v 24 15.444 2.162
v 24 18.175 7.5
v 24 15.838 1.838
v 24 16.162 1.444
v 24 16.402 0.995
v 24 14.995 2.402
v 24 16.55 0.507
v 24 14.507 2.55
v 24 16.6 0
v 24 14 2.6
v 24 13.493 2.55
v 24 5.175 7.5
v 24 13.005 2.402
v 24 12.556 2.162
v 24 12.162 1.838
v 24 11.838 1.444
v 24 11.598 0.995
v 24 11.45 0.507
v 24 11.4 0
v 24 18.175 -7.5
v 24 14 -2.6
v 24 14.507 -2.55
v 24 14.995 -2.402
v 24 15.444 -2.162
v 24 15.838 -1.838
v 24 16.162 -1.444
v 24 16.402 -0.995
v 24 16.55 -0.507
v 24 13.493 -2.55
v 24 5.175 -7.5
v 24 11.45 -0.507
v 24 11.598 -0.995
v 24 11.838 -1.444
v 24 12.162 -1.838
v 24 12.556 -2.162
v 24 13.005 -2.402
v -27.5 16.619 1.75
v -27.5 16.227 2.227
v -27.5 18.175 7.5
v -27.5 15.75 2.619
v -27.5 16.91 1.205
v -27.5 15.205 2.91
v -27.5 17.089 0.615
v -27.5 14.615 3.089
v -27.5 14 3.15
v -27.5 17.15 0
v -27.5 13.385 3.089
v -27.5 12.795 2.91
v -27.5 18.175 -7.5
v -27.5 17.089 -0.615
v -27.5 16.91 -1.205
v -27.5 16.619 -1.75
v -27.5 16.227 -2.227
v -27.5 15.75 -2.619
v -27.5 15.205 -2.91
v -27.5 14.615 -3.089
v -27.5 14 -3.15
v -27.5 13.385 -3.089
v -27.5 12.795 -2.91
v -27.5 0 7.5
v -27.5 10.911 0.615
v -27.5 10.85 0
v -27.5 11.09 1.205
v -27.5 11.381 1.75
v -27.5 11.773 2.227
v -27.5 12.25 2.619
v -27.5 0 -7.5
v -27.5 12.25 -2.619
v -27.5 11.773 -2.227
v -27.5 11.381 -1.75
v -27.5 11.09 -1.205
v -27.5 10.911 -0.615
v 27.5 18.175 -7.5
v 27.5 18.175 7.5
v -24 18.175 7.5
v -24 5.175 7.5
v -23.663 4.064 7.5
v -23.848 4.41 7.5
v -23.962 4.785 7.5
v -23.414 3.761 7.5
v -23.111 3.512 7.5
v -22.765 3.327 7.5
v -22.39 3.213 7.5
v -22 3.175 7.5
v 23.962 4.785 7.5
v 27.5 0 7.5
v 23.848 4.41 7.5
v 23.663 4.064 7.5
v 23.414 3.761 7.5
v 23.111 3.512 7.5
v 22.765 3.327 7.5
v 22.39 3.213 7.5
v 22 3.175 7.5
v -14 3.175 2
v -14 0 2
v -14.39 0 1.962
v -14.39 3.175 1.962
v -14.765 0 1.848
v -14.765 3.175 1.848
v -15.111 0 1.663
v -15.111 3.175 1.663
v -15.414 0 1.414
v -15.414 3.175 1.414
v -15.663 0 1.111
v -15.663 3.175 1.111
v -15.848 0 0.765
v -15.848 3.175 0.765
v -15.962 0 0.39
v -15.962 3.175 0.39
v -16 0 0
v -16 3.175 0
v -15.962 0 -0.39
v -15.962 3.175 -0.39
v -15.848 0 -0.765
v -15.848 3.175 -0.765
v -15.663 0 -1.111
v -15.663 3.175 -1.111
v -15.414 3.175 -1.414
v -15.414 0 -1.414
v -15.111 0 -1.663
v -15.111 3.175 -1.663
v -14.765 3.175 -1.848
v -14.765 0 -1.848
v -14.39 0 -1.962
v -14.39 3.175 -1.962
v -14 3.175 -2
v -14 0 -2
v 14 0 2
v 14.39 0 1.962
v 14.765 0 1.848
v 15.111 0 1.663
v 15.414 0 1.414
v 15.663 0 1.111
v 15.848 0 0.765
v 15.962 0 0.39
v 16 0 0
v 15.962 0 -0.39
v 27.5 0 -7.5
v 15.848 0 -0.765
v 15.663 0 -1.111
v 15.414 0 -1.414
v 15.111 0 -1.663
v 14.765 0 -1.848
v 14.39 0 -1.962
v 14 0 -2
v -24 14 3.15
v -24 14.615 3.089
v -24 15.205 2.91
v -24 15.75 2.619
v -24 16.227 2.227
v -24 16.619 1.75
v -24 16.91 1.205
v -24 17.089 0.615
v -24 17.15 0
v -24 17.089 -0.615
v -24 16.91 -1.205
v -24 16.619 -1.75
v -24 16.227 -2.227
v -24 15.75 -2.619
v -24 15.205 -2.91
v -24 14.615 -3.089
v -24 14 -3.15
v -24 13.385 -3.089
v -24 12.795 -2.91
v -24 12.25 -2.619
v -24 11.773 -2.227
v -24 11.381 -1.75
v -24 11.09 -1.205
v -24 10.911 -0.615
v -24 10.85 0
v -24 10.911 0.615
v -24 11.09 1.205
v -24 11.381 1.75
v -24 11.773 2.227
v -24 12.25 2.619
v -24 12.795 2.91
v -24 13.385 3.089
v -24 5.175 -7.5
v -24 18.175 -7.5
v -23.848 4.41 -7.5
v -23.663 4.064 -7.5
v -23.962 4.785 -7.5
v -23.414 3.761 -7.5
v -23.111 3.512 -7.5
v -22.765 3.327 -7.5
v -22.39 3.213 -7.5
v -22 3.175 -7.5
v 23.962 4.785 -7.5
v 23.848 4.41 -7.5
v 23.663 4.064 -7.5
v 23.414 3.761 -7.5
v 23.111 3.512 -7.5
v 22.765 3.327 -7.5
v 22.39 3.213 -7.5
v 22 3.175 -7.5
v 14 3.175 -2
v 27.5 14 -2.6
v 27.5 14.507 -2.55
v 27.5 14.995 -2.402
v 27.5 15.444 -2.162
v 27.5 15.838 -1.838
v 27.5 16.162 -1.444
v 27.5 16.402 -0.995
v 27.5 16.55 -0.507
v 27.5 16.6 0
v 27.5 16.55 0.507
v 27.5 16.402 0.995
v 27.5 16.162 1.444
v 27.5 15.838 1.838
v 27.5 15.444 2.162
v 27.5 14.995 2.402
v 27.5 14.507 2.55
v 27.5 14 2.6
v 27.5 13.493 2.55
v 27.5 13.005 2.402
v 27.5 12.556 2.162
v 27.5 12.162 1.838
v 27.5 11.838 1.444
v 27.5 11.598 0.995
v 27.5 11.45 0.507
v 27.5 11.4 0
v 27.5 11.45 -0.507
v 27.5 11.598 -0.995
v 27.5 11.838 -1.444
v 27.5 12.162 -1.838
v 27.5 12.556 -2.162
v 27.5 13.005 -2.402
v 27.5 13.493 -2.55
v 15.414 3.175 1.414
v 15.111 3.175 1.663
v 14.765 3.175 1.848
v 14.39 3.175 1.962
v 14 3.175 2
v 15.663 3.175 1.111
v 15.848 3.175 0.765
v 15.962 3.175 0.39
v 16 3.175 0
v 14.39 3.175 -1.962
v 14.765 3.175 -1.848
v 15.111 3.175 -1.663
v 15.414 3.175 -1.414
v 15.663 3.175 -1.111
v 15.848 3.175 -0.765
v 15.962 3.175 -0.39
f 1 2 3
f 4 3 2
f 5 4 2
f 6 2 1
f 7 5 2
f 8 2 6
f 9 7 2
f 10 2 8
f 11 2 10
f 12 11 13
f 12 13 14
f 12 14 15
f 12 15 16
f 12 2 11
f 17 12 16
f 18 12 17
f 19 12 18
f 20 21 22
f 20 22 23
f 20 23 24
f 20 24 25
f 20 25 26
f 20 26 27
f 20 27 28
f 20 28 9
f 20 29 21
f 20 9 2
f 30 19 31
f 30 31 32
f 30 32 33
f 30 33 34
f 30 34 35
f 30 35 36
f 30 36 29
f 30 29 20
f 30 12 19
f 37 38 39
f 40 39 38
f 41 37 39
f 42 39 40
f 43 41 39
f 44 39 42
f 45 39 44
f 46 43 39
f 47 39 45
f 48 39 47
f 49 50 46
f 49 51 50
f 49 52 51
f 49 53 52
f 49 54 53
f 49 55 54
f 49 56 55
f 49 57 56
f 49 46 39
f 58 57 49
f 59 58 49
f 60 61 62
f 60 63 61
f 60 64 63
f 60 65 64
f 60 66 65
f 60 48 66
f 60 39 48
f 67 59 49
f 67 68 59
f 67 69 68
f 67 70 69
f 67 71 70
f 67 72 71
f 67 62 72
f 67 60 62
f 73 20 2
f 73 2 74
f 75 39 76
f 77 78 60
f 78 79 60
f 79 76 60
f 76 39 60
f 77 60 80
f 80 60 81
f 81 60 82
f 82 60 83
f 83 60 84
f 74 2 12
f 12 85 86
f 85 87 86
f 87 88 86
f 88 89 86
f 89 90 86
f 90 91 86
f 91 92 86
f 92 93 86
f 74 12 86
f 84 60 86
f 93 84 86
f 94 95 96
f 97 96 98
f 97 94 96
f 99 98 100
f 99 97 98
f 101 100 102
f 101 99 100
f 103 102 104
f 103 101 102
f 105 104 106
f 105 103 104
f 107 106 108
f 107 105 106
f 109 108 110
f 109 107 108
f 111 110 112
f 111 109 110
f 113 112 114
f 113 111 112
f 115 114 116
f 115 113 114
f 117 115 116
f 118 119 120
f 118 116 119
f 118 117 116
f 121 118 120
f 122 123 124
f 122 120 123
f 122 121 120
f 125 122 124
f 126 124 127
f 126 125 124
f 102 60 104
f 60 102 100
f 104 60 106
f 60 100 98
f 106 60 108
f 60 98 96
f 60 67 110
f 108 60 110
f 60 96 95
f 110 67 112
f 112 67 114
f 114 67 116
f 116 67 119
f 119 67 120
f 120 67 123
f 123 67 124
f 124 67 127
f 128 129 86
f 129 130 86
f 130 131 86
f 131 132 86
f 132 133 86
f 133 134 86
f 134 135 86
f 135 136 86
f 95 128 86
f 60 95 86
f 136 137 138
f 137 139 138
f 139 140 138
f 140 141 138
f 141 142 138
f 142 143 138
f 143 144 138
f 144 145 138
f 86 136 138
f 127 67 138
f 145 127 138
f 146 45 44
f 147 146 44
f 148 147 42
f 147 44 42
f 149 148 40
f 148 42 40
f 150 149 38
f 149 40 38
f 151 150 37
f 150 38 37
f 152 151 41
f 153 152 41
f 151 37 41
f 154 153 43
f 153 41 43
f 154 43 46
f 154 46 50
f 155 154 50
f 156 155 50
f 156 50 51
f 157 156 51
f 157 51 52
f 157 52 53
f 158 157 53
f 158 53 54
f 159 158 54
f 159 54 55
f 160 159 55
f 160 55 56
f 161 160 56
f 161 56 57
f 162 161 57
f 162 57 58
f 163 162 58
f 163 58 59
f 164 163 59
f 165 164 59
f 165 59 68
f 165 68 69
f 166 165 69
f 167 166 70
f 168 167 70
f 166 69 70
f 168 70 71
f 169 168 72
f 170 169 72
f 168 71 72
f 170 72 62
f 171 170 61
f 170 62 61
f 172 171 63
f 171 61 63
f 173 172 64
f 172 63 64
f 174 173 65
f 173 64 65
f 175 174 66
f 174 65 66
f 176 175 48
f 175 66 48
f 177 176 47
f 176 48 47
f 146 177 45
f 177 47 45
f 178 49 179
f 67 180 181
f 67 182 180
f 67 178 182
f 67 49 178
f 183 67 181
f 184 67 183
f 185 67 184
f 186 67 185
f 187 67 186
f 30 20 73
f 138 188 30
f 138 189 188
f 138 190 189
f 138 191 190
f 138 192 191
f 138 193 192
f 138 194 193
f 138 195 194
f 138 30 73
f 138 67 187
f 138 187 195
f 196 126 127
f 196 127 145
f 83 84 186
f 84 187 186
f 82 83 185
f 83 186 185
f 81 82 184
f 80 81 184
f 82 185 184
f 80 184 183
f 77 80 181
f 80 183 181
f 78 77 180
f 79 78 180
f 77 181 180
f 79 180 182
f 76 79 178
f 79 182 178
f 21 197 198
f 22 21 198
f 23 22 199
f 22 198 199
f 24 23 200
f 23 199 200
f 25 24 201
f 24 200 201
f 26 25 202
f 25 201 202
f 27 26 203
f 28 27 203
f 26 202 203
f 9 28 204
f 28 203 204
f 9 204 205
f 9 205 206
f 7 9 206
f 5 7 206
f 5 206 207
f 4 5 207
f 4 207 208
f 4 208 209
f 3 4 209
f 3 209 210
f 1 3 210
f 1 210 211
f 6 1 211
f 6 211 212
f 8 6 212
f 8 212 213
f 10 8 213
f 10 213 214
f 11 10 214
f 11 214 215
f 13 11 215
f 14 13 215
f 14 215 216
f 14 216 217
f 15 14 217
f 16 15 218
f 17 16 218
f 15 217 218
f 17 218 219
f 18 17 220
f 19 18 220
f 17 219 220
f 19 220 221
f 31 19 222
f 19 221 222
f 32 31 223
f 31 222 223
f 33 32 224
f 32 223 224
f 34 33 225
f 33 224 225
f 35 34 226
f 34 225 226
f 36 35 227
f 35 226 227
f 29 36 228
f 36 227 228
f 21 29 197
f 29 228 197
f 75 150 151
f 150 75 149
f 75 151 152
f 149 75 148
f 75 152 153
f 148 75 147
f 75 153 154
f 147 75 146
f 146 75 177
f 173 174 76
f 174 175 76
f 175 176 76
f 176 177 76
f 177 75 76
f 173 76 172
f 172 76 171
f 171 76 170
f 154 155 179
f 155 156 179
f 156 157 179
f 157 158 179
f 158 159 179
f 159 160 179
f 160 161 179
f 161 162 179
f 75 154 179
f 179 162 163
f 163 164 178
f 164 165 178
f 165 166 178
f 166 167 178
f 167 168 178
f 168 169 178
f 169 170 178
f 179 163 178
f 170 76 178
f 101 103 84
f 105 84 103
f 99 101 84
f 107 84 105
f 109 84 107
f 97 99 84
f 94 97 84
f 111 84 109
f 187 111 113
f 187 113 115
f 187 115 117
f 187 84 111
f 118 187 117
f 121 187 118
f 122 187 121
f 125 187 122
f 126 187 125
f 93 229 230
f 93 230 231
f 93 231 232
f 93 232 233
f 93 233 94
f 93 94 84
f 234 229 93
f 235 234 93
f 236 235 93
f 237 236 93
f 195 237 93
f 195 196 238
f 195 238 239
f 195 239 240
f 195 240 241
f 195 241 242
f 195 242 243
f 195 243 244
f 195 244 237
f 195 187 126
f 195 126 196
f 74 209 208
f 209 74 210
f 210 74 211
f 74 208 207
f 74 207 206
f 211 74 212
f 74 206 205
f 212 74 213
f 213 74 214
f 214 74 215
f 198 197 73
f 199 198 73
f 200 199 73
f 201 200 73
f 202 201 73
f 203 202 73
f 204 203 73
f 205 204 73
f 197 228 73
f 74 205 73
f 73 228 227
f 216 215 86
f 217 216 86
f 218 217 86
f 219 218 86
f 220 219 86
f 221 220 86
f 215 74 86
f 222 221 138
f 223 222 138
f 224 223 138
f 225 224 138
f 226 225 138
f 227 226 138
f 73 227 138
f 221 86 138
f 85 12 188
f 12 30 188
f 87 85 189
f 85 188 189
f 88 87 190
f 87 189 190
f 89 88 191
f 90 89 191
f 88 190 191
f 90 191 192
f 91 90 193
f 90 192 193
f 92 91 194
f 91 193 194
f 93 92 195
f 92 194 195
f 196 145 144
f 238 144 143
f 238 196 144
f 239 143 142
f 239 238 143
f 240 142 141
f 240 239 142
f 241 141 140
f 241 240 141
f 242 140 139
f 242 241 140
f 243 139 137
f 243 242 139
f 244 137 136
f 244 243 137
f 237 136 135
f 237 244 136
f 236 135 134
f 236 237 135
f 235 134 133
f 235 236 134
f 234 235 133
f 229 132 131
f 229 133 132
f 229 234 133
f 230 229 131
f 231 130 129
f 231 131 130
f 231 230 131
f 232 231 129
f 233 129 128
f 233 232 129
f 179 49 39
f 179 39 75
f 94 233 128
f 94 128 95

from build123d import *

# Parameters (mm, degrees)
SKETCH1_W           = 55
SKETCH1_H           = 15
BOSS_EXTRUDE1_DEPTH = 3.175
SKETCH2_W           = 3.5
SKETCH2_H           = 15
BOSS_EXTRUDE2_DEPTH = 15
FILLET1_R           = 2
CUT_EXTRUDE1_DEPTH  = 33.210246817
SKETCH4_R           = 2.6
CUT_EXTRUDE2_DEPTH  = 10
SKETCH5_R           = 3.15
CUT_EXTRUDE3_DEPTH  = 5


with BuildPart() as part:
    # Sketch1 → Boss-Extrude1 (new body)
    with BuildSketch(Plane(origin=(0, 0, 0), x_dir=(1, 0, 0), z_dir=(0, 1, 0))):
        Rectangle(SKETCH1_W, SKETCH1_H)
    extrude(amount=BOSS_EXTRUDE1_DEPTH)

    # Sketch2 → Boss-Extrude2 (add)
    with BuildSketch(Plane(origin=(0, 3.175, 0), x_dir=(1, 0, 0), z_dir=(0, 1, 0))):
        with Locations((-25.75, 0)):
            Rectangle(SKETCH2_W, SKETCH2_H)
        with Locations((25.75, 0)):
            Rectangle(SKETCH2_W, SKETCH2_H)
    extrude(amount=BOSS_EXTRUDE2_DEPTH)

    # Fillet1
    fillet1_edges = [part.edges().sort_by_distance(p)[0] for p in [
        (-24, 3.175, 0),
        (24, 3.175, 0),
    ]]
    fillet(fillet1_edges, radius=FILLET1_R)

    # Sketch3 → Cut-Extrude1 (cut, through all)
    with BuildSketch(Plane(origin=(0, 3.175, 0), x_dir=(1, 0, 0), z_dir=(0, 1, 0))):
        with BuildLine():
            Line((-14, 2), (14, 2))
            ThreePointArc((14, 2), (16, 0), (14, -2))
            Line((14, -2), (-14, -2))
            ThreePointArc((-14, -2), (-16, 0), (-14, 2))
        make_face()
    extrude(amount=-CUT_EXTRUDE1_DEPTH, mode=Mode.SUBTRACT)

    # Sketch4 → Cut-Extrude2 (cut)
    with BuildSketch(Plane(origin=(27.5, 0, 0), x_dir=(0, 0, -1), z_dir=(1, 0, 0))):
        with Locations((0, 14)):
            Circle(SKETCH4_R)
    extrude(amount=-CUT_EXTRUDE2_DEPTH, mode=Mode.SUBTRACT)

    # Sketch5 → Cut-Extrude3 (cut)
    with BuildSketch(Plane.ZY.offset(27.5)):
        with Locations((0, 14)):
            Circle(SKETCH5_R)
    extrude(amount=-CUT_EXTRUDE3_DEPTH, mode=Mode.SUBTRACT)


solid = part.part
